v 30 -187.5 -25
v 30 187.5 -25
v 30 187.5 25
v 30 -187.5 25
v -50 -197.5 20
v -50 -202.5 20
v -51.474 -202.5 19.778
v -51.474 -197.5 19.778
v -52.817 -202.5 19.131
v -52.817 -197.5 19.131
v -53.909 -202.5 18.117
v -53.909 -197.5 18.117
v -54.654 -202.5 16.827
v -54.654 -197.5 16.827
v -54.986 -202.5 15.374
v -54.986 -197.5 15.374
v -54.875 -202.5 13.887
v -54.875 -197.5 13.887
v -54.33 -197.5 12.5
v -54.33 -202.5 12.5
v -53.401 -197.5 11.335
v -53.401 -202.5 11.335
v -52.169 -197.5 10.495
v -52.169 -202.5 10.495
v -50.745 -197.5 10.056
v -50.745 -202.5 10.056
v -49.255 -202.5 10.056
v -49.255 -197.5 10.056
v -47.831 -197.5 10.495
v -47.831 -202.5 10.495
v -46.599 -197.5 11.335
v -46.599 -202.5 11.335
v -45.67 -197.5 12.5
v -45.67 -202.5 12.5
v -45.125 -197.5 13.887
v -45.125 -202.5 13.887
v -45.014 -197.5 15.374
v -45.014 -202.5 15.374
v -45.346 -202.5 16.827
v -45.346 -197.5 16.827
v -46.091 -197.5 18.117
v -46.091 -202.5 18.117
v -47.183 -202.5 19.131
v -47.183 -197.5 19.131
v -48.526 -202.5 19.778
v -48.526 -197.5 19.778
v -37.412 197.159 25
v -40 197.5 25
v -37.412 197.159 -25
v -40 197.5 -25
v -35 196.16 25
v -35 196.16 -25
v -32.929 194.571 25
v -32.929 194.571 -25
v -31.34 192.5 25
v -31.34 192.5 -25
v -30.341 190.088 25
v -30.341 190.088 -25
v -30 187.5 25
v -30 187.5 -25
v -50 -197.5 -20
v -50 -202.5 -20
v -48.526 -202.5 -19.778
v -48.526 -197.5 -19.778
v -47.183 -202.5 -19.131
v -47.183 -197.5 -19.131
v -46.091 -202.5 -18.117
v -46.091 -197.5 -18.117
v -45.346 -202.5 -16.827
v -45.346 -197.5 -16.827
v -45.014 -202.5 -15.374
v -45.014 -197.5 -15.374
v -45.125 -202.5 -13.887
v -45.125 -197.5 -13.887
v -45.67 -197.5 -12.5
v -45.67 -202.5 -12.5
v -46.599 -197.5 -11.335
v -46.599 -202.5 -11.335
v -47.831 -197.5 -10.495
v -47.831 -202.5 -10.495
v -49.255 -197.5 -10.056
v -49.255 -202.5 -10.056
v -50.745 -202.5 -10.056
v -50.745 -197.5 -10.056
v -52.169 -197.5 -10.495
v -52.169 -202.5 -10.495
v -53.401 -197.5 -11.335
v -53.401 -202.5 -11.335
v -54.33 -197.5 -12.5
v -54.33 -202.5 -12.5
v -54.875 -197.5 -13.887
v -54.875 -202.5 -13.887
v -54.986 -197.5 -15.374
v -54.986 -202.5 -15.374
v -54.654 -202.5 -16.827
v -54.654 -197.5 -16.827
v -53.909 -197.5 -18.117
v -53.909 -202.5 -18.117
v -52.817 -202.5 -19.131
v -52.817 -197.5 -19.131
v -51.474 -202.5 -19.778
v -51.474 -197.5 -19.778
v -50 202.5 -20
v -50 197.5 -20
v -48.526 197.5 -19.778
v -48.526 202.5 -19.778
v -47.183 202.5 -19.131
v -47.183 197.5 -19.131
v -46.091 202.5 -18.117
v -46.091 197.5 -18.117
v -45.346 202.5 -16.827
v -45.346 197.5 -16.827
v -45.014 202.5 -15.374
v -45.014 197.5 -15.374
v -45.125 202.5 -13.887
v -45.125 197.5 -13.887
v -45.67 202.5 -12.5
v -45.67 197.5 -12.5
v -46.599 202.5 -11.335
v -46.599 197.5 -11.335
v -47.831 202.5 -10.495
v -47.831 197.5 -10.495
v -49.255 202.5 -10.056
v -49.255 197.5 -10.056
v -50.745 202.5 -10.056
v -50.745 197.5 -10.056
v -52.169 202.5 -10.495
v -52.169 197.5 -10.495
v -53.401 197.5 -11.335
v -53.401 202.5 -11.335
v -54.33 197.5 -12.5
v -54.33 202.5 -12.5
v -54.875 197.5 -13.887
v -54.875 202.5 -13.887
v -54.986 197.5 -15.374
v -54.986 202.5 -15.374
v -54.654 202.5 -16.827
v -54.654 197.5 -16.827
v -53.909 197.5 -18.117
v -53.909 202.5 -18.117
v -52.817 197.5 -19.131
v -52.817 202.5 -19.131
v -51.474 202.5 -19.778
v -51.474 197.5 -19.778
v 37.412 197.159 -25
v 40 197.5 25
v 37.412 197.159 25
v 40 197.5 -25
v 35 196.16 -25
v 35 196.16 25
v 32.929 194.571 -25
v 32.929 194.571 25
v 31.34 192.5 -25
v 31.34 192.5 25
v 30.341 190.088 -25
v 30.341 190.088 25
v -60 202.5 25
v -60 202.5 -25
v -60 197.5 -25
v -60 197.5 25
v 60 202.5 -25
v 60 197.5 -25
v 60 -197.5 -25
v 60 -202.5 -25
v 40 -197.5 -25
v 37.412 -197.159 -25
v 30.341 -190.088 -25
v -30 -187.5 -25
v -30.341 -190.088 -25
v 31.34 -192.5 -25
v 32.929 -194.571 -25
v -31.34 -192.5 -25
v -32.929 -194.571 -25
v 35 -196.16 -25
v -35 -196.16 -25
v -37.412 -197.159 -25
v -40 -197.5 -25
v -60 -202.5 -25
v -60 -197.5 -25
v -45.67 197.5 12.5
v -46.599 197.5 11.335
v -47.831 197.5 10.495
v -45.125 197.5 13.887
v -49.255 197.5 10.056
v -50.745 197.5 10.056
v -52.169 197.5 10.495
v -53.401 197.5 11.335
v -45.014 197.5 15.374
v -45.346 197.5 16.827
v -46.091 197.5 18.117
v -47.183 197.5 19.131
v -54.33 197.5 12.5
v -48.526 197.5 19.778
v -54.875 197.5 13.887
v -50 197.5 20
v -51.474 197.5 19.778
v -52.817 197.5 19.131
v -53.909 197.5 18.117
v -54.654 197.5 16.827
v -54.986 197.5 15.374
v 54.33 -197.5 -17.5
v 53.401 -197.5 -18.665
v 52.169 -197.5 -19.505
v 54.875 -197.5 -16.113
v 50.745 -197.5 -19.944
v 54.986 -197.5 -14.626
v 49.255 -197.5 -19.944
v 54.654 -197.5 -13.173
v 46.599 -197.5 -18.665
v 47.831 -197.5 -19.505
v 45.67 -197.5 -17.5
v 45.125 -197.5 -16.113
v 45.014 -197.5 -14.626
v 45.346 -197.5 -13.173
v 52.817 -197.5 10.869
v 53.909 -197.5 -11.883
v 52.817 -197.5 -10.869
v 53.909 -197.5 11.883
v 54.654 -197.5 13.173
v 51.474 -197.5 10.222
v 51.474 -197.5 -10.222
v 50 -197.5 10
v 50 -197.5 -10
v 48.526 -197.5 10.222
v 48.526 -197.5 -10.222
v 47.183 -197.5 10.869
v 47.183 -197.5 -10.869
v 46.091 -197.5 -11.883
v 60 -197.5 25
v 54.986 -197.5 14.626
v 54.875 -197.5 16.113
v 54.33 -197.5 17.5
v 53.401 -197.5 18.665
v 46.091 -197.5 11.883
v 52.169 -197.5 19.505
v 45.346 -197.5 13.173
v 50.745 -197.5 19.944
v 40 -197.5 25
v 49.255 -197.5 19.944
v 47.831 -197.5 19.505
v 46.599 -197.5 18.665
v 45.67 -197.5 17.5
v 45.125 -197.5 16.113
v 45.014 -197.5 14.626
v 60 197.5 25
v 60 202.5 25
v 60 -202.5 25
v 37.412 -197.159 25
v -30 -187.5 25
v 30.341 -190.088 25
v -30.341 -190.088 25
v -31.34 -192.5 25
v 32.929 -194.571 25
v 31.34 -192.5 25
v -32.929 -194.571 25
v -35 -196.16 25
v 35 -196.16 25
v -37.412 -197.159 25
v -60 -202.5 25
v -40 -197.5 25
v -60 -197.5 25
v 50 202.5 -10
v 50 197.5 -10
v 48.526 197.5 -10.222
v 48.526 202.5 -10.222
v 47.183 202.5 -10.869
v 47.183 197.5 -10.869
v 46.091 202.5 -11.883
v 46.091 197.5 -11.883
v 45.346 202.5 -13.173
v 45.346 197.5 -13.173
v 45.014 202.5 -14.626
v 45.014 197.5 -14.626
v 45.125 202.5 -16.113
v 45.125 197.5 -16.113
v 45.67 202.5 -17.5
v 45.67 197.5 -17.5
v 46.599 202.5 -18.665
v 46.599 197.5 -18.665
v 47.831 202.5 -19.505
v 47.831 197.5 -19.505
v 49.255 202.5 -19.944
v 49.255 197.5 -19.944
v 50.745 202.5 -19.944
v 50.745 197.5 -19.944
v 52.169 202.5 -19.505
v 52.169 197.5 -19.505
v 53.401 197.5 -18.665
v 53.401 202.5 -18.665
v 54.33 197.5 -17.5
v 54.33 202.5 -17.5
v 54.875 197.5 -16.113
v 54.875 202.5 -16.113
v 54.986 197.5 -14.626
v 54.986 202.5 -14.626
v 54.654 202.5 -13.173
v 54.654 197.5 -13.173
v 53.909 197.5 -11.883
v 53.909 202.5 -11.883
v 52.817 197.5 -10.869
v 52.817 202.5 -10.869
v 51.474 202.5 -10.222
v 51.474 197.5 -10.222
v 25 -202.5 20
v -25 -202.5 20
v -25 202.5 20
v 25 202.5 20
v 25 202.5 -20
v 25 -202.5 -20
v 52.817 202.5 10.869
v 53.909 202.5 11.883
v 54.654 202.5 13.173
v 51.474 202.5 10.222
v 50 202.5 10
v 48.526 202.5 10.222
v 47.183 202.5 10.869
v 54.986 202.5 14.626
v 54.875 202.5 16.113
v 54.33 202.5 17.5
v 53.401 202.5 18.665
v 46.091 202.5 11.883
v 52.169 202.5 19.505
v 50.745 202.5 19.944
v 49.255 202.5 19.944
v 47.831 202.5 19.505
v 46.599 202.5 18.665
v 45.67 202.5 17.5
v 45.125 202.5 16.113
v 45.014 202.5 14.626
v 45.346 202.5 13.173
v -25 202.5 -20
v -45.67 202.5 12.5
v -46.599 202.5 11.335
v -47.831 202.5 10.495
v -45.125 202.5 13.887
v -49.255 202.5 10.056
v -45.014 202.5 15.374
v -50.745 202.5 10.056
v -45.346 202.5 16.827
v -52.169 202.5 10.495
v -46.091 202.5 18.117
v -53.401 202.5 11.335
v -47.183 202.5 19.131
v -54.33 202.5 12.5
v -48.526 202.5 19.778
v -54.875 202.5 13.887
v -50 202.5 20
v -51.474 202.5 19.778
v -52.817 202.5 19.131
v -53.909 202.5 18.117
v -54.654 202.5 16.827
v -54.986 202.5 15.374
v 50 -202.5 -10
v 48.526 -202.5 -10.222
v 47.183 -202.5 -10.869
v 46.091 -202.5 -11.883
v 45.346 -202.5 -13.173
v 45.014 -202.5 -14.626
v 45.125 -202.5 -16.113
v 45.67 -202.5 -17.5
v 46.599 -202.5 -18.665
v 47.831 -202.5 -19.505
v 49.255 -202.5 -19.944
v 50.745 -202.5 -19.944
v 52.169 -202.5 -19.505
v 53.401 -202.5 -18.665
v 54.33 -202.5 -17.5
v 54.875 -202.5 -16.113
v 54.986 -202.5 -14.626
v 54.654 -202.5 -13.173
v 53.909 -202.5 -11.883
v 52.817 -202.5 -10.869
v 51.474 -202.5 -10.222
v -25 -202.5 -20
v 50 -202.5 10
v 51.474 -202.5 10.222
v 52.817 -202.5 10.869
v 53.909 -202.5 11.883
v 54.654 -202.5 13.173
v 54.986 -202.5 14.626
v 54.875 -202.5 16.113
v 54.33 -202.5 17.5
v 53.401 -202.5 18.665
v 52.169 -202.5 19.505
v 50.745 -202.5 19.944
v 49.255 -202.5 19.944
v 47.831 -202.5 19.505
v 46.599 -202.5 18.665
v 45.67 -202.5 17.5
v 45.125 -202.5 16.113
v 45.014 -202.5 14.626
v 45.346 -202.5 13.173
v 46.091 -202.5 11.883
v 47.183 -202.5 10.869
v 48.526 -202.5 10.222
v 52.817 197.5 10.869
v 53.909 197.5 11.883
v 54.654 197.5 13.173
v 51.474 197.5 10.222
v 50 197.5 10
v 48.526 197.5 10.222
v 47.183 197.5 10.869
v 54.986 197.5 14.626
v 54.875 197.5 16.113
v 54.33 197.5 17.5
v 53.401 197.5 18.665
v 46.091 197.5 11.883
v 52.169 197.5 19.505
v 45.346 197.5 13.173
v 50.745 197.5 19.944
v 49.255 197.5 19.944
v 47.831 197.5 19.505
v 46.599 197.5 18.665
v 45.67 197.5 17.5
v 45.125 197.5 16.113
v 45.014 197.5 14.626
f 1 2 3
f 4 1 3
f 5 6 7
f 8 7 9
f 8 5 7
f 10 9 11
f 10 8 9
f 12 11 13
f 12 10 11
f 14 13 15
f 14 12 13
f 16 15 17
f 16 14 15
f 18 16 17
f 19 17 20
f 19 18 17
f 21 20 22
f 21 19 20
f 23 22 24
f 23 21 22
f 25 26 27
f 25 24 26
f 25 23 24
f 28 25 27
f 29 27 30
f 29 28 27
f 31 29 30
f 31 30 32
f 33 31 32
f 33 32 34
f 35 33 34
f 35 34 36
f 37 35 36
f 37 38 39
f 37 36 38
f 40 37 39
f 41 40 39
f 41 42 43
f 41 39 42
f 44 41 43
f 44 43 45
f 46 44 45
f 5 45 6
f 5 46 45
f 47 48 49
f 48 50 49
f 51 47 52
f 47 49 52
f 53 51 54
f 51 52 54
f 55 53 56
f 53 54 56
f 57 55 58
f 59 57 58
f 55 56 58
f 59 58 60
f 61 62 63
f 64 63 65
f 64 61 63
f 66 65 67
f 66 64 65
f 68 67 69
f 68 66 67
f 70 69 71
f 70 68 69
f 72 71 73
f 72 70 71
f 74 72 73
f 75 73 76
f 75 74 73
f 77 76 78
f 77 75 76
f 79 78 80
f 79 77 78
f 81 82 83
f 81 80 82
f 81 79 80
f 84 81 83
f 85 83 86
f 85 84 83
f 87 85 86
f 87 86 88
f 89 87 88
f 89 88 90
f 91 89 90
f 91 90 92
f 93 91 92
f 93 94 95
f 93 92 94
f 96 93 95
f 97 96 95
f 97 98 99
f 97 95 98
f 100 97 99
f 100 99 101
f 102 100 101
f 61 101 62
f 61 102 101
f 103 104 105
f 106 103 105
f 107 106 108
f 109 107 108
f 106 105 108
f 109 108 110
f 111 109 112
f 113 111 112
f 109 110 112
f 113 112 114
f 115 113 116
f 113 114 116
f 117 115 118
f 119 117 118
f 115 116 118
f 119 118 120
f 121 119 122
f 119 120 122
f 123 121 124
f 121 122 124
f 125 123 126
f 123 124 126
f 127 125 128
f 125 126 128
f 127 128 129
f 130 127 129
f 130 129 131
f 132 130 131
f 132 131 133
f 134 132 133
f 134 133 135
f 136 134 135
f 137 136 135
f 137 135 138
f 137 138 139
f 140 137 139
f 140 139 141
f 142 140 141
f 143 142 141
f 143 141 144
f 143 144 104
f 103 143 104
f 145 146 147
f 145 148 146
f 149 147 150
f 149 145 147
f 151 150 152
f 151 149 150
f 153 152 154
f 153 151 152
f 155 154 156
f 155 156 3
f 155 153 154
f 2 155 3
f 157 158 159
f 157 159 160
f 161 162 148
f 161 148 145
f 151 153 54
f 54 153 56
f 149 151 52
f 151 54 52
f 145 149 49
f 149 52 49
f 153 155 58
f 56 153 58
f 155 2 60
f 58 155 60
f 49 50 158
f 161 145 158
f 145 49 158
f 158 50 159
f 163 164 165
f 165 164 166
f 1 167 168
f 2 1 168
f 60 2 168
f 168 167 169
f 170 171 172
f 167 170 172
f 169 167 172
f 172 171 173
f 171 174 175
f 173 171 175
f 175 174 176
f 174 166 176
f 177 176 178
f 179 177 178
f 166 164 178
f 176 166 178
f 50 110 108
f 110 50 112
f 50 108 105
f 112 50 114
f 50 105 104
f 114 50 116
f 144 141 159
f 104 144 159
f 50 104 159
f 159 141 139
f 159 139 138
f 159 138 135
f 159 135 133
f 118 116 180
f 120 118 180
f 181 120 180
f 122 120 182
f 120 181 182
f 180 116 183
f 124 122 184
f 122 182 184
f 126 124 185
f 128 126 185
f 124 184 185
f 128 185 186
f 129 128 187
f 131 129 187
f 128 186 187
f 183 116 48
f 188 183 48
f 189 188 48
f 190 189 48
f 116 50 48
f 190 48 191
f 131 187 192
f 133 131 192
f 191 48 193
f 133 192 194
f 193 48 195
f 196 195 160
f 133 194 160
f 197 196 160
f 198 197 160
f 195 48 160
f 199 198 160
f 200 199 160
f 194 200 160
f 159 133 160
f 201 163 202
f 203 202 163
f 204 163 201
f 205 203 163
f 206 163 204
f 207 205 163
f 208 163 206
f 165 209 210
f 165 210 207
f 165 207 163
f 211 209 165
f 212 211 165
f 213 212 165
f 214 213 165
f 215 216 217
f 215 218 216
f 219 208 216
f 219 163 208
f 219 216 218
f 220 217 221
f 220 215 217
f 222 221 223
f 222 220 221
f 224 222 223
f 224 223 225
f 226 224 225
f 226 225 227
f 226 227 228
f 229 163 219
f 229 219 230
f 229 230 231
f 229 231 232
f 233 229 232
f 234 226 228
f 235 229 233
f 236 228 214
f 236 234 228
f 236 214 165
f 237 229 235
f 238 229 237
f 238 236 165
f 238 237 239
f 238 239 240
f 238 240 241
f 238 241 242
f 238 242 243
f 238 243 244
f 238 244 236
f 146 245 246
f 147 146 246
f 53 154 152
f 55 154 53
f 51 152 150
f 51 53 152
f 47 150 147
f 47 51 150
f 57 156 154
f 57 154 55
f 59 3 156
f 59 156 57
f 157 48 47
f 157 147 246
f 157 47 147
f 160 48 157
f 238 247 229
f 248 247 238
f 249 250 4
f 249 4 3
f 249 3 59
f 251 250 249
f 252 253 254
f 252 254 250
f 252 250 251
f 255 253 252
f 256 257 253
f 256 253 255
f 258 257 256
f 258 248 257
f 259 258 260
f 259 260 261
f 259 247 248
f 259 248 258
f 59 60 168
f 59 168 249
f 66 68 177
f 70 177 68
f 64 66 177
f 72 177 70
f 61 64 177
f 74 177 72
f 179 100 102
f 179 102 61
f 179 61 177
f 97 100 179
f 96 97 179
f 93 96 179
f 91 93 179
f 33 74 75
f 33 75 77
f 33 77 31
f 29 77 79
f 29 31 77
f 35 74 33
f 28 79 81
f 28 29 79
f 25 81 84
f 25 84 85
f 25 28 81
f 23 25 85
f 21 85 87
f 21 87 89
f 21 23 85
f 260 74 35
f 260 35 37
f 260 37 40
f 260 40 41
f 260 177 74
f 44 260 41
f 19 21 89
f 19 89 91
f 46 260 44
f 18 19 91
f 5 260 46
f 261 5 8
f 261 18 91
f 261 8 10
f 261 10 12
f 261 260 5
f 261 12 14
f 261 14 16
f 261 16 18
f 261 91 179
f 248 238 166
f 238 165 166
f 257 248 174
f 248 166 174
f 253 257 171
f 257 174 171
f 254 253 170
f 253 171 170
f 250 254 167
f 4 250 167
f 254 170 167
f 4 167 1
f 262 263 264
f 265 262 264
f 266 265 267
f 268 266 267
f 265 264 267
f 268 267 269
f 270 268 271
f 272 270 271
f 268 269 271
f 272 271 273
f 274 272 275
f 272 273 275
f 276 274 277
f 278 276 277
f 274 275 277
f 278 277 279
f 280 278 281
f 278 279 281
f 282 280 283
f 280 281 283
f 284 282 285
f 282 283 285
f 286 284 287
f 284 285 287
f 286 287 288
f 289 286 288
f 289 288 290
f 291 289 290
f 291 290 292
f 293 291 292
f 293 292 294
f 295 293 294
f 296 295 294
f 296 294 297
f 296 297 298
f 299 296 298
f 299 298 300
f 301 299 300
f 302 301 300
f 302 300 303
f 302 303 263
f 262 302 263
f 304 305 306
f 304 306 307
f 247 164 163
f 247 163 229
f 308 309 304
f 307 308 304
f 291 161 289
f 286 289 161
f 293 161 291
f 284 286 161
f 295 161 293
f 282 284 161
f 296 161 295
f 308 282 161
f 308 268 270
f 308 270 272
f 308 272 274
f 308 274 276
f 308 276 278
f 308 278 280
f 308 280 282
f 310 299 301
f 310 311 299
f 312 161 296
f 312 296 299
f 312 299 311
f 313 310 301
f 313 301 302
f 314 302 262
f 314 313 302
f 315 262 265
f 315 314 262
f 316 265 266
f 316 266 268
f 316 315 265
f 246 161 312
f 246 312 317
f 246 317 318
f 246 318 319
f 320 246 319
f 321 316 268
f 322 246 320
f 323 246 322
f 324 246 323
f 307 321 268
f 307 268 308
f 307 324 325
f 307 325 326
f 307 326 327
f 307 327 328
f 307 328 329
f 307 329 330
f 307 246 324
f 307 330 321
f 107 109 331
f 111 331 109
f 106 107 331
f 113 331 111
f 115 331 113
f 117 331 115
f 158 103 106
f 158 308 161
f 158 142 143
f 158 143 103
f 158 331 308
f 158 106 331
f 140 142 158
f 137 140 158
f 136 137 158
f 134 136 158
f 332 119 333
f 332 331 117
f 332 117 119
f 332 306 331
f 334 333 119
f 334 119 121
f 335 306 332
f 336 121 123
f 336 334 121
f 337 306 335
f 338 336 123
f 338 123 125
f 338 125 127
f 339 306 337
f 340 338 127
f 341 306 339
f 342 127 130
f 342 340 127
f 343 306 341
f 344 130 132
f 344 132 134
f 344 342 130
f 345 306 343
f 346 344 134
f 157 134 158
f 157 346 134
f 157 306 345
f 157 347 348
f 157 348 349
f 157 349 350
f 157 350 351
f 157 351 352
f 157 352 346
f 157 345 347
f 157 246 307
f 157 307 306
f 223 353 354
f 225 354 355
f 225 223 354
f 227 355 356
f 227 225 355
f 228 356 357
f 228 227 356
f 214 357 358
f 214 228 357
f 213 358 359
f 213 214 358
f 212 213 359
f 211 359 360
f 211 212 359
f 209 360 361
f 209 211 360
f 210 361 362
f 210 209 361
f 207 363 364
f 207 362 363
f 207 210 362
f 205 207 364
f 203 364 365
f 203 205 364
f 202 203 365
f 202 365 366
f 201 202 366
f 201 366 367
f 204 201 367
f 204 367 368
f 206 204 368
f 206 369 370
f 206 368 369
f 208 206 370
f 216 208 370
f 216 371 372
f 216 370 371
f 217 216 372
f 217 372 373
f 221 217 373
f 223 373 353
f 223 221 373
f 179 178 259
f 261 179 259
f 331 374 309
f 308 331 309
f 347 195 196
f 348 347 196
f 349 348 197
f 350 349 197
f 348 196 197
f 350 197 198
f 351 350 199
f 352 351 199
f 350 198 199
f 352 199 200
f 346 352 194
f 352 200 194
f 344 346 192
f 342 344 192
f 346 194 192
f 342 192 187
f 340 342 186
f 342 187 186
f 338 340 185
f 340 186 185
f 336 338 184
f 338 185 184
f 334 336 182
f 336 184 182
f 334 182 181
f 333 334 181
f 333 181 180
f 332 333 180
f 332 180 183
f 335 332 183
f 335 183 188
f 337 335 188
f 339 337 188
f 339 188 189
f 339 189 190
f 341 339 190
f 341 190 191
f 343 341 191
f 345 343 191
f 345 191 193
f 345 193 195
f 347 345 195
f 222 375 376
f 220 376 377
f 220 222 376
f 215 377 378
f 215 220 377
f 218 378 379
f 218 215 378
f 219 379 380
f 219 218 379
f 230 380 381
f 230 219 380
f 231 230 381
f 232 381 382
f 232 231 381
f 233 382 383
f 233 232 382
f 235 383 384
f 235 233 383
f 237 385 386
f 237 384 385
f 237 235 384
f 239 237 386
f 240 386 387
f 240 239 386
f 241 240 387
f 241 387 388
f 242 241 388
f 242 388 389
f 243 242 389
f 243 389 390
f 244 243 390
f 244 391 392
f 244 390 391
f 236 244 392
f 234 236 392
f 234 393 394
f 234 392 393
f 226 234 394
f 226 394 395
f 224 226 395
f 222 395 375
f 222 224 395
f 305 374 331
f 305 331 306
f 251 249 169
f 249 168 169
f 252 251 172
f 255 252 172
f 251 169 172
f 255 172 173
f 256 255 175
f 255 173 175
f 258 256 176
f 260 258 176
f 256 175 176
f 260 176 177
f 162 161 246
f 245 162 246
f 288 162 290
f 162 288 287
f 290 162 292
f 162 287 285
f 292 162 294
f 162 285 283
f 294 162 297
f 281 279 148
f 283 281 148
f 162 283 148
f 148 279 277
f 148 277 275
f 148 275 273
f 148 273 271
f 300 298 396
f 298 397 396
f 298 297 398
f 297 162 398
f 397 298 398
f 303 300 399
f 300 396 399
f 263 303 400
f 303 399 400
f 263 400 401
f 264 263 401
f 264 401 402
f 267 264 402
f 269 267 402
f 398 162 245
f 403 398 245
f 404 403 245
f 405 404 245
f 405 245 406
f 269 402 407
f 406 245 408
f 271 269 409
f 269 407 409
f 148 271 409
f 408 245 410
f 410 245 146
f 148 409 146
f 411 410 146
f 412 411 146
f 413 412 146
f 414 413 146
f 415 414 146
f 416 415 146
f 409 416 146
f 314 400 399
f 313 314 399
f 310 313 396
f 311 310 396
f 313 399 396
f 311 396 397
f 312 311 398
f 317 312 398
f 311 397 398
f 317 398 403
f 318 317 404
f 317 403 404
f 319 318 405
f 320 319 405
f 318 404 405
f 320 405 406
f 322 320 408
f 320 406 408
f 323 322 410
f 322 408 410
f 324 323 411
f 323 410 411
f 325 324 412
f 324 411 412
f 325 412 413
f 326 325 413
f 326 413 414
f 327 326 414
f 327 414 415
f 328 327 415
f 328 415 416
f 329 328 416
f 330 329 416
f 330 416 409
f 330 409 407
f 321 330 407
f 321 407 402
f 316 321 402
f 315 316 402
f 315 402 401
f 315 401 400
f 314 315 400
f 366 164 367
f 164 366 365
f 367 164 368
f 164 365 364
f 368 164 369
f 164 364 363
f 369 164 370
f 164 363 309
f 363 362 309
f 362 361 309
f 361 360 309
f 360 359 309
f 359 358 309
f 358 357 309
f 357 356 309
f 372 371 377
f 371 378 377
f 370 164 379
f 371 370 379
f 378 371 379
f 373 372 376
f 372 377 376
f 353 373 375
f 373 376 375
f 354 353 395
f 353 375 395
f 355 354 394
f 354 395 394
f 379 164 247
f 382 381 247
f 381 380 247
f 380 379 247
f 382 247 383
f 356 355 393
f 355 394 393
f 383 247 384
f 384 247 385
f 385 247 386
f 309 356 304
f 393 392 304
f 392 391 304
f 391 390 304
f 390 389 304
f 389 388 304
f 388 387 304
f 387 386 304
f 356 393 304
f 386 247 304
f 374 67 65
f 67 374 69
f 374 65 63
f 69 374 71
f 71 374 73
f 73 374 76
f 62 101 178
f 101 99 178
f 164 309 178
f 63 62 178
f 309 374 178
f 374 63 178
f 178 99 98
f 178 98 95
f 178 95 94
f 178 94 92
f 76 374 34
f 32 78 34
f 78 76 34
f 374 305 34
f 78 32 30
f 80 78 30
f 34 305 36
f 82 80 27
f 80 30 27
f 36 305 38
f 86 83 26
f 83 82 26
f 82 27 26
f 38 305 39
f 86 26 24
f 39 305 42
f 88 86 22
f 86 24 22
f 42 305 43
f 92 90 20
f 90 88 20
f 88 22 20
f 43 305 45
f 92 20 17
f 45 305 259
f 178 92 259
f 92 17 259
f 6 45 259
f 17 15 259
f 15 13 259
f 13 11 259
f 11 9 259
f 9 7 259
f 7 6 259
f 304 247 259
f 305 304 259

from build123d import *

# Parameters (mm, degrees)
SKETCH1_W            = 60
SKETCH1_H            = 50
BOSS_EXTRUDE1_DEPTH  = 200
SKETCH2_W            = 120
SKETCH2_H            = 50
BOSS_EXTRUDE2_DEPTH  = 2.5
FILLET1_R            = 10
SKETCH3_R            = 5
CUT_EXTRUDE1_DEPTH   = 403.779406127
FILLET1_OF_MIRROR1_R = 10
SKETCH4_W            = 50
SKETCH4_H            = 40
CUT_EXTRUDE2_DEPTH   = 411.18288604


with BuildPart() as part:
    # Sketch1 → Boss-Extrude1 (new, symmetric)
    with BuildSketch(Plane(origin=(0, 0, 0), x_dir=(-1, 0, 0), z_dir=(0, 1, 0))):
        Rectangle(SKETCH1_W, SKETCH1_H)
    extrude(amount=BOSS_EXTRUDE1_DEPTH, both=True)

    # Sketch2 → Boss-Extrude2 (add, symmetric)
    with BuildSketch(Plane(origin=(0, 200, 0), x_dir=(-1, 0, 0), z_dir=(0, 1, 0))):
        Rectangle(SKETCH2_W, SKETCH2_H)
    boss_extrude2 = extrude(amount=BOSS_EXTRUDE2_DEPTH, both=True)

    # Fillet1
    fillet1_edges = [part.edges().sort_by_distance(p)[0] for p in [
        (-30, 197.5, 0),
        (30, 197.5, 0),
    ]]
    fillet(fillet1_edges, radius=FILLET1_R)

    # Sketch3 → Cut-Extrude1 (cut, through all)
    with BuildSketch(Plane.XZ.offset(-197.5)):
        with Locations(Location((50, 15, 0), (0, 0, 270))):
            Circle(SKETCH3_R)
        with Locations(Location((50, -15, 0), (0, 0, 90))):
            Circle(SKETCH3_R)
        with Locations(Location((-50, 15, 0), (0, 0, 90))):
            Circle(SKETCH3_R)
        with Locations(Location((-50, -15, 0), (0, 0, 270))):
            Circle(SKETCH3_R)
    cut_extrude1 = extrude(amount=-CUT_EXTRUDE1_DEPTH, mode=Mode.SUBTRACT)

    # Mirror1: Boss-Extrude2, Cut-Extrude1 across plane
    add(boss_extrude2.mirror(Plane.ZX))
    add(cut_extrude1.mirror(Plane.ZX), mode=Mode.SUBTRACT)

    # Fillet1 of Mirror1
    fillet1_of_mirror1_edges = [part.edges().sort_by_distance(p)[0] for p in [
        (-30, -197.5, 0),
        (30, -197.5, 0),
    ]]
    fillet(fillet1_of_mirror1_edges, radius=FILLET1_OF_MIRROR1_R)

    # Sketch4 → Cut-Extrude2 (cut, through all)
    with BuildSketch(Plane.XZ.offset(202.5)):
        Rectangle(SKETCH4_W, SKETCH4_H)
    extrude(amount=-CUT_EXTRUDE2_DEPTH, mode=Mode.SUBTRACT)


solid = part.part
